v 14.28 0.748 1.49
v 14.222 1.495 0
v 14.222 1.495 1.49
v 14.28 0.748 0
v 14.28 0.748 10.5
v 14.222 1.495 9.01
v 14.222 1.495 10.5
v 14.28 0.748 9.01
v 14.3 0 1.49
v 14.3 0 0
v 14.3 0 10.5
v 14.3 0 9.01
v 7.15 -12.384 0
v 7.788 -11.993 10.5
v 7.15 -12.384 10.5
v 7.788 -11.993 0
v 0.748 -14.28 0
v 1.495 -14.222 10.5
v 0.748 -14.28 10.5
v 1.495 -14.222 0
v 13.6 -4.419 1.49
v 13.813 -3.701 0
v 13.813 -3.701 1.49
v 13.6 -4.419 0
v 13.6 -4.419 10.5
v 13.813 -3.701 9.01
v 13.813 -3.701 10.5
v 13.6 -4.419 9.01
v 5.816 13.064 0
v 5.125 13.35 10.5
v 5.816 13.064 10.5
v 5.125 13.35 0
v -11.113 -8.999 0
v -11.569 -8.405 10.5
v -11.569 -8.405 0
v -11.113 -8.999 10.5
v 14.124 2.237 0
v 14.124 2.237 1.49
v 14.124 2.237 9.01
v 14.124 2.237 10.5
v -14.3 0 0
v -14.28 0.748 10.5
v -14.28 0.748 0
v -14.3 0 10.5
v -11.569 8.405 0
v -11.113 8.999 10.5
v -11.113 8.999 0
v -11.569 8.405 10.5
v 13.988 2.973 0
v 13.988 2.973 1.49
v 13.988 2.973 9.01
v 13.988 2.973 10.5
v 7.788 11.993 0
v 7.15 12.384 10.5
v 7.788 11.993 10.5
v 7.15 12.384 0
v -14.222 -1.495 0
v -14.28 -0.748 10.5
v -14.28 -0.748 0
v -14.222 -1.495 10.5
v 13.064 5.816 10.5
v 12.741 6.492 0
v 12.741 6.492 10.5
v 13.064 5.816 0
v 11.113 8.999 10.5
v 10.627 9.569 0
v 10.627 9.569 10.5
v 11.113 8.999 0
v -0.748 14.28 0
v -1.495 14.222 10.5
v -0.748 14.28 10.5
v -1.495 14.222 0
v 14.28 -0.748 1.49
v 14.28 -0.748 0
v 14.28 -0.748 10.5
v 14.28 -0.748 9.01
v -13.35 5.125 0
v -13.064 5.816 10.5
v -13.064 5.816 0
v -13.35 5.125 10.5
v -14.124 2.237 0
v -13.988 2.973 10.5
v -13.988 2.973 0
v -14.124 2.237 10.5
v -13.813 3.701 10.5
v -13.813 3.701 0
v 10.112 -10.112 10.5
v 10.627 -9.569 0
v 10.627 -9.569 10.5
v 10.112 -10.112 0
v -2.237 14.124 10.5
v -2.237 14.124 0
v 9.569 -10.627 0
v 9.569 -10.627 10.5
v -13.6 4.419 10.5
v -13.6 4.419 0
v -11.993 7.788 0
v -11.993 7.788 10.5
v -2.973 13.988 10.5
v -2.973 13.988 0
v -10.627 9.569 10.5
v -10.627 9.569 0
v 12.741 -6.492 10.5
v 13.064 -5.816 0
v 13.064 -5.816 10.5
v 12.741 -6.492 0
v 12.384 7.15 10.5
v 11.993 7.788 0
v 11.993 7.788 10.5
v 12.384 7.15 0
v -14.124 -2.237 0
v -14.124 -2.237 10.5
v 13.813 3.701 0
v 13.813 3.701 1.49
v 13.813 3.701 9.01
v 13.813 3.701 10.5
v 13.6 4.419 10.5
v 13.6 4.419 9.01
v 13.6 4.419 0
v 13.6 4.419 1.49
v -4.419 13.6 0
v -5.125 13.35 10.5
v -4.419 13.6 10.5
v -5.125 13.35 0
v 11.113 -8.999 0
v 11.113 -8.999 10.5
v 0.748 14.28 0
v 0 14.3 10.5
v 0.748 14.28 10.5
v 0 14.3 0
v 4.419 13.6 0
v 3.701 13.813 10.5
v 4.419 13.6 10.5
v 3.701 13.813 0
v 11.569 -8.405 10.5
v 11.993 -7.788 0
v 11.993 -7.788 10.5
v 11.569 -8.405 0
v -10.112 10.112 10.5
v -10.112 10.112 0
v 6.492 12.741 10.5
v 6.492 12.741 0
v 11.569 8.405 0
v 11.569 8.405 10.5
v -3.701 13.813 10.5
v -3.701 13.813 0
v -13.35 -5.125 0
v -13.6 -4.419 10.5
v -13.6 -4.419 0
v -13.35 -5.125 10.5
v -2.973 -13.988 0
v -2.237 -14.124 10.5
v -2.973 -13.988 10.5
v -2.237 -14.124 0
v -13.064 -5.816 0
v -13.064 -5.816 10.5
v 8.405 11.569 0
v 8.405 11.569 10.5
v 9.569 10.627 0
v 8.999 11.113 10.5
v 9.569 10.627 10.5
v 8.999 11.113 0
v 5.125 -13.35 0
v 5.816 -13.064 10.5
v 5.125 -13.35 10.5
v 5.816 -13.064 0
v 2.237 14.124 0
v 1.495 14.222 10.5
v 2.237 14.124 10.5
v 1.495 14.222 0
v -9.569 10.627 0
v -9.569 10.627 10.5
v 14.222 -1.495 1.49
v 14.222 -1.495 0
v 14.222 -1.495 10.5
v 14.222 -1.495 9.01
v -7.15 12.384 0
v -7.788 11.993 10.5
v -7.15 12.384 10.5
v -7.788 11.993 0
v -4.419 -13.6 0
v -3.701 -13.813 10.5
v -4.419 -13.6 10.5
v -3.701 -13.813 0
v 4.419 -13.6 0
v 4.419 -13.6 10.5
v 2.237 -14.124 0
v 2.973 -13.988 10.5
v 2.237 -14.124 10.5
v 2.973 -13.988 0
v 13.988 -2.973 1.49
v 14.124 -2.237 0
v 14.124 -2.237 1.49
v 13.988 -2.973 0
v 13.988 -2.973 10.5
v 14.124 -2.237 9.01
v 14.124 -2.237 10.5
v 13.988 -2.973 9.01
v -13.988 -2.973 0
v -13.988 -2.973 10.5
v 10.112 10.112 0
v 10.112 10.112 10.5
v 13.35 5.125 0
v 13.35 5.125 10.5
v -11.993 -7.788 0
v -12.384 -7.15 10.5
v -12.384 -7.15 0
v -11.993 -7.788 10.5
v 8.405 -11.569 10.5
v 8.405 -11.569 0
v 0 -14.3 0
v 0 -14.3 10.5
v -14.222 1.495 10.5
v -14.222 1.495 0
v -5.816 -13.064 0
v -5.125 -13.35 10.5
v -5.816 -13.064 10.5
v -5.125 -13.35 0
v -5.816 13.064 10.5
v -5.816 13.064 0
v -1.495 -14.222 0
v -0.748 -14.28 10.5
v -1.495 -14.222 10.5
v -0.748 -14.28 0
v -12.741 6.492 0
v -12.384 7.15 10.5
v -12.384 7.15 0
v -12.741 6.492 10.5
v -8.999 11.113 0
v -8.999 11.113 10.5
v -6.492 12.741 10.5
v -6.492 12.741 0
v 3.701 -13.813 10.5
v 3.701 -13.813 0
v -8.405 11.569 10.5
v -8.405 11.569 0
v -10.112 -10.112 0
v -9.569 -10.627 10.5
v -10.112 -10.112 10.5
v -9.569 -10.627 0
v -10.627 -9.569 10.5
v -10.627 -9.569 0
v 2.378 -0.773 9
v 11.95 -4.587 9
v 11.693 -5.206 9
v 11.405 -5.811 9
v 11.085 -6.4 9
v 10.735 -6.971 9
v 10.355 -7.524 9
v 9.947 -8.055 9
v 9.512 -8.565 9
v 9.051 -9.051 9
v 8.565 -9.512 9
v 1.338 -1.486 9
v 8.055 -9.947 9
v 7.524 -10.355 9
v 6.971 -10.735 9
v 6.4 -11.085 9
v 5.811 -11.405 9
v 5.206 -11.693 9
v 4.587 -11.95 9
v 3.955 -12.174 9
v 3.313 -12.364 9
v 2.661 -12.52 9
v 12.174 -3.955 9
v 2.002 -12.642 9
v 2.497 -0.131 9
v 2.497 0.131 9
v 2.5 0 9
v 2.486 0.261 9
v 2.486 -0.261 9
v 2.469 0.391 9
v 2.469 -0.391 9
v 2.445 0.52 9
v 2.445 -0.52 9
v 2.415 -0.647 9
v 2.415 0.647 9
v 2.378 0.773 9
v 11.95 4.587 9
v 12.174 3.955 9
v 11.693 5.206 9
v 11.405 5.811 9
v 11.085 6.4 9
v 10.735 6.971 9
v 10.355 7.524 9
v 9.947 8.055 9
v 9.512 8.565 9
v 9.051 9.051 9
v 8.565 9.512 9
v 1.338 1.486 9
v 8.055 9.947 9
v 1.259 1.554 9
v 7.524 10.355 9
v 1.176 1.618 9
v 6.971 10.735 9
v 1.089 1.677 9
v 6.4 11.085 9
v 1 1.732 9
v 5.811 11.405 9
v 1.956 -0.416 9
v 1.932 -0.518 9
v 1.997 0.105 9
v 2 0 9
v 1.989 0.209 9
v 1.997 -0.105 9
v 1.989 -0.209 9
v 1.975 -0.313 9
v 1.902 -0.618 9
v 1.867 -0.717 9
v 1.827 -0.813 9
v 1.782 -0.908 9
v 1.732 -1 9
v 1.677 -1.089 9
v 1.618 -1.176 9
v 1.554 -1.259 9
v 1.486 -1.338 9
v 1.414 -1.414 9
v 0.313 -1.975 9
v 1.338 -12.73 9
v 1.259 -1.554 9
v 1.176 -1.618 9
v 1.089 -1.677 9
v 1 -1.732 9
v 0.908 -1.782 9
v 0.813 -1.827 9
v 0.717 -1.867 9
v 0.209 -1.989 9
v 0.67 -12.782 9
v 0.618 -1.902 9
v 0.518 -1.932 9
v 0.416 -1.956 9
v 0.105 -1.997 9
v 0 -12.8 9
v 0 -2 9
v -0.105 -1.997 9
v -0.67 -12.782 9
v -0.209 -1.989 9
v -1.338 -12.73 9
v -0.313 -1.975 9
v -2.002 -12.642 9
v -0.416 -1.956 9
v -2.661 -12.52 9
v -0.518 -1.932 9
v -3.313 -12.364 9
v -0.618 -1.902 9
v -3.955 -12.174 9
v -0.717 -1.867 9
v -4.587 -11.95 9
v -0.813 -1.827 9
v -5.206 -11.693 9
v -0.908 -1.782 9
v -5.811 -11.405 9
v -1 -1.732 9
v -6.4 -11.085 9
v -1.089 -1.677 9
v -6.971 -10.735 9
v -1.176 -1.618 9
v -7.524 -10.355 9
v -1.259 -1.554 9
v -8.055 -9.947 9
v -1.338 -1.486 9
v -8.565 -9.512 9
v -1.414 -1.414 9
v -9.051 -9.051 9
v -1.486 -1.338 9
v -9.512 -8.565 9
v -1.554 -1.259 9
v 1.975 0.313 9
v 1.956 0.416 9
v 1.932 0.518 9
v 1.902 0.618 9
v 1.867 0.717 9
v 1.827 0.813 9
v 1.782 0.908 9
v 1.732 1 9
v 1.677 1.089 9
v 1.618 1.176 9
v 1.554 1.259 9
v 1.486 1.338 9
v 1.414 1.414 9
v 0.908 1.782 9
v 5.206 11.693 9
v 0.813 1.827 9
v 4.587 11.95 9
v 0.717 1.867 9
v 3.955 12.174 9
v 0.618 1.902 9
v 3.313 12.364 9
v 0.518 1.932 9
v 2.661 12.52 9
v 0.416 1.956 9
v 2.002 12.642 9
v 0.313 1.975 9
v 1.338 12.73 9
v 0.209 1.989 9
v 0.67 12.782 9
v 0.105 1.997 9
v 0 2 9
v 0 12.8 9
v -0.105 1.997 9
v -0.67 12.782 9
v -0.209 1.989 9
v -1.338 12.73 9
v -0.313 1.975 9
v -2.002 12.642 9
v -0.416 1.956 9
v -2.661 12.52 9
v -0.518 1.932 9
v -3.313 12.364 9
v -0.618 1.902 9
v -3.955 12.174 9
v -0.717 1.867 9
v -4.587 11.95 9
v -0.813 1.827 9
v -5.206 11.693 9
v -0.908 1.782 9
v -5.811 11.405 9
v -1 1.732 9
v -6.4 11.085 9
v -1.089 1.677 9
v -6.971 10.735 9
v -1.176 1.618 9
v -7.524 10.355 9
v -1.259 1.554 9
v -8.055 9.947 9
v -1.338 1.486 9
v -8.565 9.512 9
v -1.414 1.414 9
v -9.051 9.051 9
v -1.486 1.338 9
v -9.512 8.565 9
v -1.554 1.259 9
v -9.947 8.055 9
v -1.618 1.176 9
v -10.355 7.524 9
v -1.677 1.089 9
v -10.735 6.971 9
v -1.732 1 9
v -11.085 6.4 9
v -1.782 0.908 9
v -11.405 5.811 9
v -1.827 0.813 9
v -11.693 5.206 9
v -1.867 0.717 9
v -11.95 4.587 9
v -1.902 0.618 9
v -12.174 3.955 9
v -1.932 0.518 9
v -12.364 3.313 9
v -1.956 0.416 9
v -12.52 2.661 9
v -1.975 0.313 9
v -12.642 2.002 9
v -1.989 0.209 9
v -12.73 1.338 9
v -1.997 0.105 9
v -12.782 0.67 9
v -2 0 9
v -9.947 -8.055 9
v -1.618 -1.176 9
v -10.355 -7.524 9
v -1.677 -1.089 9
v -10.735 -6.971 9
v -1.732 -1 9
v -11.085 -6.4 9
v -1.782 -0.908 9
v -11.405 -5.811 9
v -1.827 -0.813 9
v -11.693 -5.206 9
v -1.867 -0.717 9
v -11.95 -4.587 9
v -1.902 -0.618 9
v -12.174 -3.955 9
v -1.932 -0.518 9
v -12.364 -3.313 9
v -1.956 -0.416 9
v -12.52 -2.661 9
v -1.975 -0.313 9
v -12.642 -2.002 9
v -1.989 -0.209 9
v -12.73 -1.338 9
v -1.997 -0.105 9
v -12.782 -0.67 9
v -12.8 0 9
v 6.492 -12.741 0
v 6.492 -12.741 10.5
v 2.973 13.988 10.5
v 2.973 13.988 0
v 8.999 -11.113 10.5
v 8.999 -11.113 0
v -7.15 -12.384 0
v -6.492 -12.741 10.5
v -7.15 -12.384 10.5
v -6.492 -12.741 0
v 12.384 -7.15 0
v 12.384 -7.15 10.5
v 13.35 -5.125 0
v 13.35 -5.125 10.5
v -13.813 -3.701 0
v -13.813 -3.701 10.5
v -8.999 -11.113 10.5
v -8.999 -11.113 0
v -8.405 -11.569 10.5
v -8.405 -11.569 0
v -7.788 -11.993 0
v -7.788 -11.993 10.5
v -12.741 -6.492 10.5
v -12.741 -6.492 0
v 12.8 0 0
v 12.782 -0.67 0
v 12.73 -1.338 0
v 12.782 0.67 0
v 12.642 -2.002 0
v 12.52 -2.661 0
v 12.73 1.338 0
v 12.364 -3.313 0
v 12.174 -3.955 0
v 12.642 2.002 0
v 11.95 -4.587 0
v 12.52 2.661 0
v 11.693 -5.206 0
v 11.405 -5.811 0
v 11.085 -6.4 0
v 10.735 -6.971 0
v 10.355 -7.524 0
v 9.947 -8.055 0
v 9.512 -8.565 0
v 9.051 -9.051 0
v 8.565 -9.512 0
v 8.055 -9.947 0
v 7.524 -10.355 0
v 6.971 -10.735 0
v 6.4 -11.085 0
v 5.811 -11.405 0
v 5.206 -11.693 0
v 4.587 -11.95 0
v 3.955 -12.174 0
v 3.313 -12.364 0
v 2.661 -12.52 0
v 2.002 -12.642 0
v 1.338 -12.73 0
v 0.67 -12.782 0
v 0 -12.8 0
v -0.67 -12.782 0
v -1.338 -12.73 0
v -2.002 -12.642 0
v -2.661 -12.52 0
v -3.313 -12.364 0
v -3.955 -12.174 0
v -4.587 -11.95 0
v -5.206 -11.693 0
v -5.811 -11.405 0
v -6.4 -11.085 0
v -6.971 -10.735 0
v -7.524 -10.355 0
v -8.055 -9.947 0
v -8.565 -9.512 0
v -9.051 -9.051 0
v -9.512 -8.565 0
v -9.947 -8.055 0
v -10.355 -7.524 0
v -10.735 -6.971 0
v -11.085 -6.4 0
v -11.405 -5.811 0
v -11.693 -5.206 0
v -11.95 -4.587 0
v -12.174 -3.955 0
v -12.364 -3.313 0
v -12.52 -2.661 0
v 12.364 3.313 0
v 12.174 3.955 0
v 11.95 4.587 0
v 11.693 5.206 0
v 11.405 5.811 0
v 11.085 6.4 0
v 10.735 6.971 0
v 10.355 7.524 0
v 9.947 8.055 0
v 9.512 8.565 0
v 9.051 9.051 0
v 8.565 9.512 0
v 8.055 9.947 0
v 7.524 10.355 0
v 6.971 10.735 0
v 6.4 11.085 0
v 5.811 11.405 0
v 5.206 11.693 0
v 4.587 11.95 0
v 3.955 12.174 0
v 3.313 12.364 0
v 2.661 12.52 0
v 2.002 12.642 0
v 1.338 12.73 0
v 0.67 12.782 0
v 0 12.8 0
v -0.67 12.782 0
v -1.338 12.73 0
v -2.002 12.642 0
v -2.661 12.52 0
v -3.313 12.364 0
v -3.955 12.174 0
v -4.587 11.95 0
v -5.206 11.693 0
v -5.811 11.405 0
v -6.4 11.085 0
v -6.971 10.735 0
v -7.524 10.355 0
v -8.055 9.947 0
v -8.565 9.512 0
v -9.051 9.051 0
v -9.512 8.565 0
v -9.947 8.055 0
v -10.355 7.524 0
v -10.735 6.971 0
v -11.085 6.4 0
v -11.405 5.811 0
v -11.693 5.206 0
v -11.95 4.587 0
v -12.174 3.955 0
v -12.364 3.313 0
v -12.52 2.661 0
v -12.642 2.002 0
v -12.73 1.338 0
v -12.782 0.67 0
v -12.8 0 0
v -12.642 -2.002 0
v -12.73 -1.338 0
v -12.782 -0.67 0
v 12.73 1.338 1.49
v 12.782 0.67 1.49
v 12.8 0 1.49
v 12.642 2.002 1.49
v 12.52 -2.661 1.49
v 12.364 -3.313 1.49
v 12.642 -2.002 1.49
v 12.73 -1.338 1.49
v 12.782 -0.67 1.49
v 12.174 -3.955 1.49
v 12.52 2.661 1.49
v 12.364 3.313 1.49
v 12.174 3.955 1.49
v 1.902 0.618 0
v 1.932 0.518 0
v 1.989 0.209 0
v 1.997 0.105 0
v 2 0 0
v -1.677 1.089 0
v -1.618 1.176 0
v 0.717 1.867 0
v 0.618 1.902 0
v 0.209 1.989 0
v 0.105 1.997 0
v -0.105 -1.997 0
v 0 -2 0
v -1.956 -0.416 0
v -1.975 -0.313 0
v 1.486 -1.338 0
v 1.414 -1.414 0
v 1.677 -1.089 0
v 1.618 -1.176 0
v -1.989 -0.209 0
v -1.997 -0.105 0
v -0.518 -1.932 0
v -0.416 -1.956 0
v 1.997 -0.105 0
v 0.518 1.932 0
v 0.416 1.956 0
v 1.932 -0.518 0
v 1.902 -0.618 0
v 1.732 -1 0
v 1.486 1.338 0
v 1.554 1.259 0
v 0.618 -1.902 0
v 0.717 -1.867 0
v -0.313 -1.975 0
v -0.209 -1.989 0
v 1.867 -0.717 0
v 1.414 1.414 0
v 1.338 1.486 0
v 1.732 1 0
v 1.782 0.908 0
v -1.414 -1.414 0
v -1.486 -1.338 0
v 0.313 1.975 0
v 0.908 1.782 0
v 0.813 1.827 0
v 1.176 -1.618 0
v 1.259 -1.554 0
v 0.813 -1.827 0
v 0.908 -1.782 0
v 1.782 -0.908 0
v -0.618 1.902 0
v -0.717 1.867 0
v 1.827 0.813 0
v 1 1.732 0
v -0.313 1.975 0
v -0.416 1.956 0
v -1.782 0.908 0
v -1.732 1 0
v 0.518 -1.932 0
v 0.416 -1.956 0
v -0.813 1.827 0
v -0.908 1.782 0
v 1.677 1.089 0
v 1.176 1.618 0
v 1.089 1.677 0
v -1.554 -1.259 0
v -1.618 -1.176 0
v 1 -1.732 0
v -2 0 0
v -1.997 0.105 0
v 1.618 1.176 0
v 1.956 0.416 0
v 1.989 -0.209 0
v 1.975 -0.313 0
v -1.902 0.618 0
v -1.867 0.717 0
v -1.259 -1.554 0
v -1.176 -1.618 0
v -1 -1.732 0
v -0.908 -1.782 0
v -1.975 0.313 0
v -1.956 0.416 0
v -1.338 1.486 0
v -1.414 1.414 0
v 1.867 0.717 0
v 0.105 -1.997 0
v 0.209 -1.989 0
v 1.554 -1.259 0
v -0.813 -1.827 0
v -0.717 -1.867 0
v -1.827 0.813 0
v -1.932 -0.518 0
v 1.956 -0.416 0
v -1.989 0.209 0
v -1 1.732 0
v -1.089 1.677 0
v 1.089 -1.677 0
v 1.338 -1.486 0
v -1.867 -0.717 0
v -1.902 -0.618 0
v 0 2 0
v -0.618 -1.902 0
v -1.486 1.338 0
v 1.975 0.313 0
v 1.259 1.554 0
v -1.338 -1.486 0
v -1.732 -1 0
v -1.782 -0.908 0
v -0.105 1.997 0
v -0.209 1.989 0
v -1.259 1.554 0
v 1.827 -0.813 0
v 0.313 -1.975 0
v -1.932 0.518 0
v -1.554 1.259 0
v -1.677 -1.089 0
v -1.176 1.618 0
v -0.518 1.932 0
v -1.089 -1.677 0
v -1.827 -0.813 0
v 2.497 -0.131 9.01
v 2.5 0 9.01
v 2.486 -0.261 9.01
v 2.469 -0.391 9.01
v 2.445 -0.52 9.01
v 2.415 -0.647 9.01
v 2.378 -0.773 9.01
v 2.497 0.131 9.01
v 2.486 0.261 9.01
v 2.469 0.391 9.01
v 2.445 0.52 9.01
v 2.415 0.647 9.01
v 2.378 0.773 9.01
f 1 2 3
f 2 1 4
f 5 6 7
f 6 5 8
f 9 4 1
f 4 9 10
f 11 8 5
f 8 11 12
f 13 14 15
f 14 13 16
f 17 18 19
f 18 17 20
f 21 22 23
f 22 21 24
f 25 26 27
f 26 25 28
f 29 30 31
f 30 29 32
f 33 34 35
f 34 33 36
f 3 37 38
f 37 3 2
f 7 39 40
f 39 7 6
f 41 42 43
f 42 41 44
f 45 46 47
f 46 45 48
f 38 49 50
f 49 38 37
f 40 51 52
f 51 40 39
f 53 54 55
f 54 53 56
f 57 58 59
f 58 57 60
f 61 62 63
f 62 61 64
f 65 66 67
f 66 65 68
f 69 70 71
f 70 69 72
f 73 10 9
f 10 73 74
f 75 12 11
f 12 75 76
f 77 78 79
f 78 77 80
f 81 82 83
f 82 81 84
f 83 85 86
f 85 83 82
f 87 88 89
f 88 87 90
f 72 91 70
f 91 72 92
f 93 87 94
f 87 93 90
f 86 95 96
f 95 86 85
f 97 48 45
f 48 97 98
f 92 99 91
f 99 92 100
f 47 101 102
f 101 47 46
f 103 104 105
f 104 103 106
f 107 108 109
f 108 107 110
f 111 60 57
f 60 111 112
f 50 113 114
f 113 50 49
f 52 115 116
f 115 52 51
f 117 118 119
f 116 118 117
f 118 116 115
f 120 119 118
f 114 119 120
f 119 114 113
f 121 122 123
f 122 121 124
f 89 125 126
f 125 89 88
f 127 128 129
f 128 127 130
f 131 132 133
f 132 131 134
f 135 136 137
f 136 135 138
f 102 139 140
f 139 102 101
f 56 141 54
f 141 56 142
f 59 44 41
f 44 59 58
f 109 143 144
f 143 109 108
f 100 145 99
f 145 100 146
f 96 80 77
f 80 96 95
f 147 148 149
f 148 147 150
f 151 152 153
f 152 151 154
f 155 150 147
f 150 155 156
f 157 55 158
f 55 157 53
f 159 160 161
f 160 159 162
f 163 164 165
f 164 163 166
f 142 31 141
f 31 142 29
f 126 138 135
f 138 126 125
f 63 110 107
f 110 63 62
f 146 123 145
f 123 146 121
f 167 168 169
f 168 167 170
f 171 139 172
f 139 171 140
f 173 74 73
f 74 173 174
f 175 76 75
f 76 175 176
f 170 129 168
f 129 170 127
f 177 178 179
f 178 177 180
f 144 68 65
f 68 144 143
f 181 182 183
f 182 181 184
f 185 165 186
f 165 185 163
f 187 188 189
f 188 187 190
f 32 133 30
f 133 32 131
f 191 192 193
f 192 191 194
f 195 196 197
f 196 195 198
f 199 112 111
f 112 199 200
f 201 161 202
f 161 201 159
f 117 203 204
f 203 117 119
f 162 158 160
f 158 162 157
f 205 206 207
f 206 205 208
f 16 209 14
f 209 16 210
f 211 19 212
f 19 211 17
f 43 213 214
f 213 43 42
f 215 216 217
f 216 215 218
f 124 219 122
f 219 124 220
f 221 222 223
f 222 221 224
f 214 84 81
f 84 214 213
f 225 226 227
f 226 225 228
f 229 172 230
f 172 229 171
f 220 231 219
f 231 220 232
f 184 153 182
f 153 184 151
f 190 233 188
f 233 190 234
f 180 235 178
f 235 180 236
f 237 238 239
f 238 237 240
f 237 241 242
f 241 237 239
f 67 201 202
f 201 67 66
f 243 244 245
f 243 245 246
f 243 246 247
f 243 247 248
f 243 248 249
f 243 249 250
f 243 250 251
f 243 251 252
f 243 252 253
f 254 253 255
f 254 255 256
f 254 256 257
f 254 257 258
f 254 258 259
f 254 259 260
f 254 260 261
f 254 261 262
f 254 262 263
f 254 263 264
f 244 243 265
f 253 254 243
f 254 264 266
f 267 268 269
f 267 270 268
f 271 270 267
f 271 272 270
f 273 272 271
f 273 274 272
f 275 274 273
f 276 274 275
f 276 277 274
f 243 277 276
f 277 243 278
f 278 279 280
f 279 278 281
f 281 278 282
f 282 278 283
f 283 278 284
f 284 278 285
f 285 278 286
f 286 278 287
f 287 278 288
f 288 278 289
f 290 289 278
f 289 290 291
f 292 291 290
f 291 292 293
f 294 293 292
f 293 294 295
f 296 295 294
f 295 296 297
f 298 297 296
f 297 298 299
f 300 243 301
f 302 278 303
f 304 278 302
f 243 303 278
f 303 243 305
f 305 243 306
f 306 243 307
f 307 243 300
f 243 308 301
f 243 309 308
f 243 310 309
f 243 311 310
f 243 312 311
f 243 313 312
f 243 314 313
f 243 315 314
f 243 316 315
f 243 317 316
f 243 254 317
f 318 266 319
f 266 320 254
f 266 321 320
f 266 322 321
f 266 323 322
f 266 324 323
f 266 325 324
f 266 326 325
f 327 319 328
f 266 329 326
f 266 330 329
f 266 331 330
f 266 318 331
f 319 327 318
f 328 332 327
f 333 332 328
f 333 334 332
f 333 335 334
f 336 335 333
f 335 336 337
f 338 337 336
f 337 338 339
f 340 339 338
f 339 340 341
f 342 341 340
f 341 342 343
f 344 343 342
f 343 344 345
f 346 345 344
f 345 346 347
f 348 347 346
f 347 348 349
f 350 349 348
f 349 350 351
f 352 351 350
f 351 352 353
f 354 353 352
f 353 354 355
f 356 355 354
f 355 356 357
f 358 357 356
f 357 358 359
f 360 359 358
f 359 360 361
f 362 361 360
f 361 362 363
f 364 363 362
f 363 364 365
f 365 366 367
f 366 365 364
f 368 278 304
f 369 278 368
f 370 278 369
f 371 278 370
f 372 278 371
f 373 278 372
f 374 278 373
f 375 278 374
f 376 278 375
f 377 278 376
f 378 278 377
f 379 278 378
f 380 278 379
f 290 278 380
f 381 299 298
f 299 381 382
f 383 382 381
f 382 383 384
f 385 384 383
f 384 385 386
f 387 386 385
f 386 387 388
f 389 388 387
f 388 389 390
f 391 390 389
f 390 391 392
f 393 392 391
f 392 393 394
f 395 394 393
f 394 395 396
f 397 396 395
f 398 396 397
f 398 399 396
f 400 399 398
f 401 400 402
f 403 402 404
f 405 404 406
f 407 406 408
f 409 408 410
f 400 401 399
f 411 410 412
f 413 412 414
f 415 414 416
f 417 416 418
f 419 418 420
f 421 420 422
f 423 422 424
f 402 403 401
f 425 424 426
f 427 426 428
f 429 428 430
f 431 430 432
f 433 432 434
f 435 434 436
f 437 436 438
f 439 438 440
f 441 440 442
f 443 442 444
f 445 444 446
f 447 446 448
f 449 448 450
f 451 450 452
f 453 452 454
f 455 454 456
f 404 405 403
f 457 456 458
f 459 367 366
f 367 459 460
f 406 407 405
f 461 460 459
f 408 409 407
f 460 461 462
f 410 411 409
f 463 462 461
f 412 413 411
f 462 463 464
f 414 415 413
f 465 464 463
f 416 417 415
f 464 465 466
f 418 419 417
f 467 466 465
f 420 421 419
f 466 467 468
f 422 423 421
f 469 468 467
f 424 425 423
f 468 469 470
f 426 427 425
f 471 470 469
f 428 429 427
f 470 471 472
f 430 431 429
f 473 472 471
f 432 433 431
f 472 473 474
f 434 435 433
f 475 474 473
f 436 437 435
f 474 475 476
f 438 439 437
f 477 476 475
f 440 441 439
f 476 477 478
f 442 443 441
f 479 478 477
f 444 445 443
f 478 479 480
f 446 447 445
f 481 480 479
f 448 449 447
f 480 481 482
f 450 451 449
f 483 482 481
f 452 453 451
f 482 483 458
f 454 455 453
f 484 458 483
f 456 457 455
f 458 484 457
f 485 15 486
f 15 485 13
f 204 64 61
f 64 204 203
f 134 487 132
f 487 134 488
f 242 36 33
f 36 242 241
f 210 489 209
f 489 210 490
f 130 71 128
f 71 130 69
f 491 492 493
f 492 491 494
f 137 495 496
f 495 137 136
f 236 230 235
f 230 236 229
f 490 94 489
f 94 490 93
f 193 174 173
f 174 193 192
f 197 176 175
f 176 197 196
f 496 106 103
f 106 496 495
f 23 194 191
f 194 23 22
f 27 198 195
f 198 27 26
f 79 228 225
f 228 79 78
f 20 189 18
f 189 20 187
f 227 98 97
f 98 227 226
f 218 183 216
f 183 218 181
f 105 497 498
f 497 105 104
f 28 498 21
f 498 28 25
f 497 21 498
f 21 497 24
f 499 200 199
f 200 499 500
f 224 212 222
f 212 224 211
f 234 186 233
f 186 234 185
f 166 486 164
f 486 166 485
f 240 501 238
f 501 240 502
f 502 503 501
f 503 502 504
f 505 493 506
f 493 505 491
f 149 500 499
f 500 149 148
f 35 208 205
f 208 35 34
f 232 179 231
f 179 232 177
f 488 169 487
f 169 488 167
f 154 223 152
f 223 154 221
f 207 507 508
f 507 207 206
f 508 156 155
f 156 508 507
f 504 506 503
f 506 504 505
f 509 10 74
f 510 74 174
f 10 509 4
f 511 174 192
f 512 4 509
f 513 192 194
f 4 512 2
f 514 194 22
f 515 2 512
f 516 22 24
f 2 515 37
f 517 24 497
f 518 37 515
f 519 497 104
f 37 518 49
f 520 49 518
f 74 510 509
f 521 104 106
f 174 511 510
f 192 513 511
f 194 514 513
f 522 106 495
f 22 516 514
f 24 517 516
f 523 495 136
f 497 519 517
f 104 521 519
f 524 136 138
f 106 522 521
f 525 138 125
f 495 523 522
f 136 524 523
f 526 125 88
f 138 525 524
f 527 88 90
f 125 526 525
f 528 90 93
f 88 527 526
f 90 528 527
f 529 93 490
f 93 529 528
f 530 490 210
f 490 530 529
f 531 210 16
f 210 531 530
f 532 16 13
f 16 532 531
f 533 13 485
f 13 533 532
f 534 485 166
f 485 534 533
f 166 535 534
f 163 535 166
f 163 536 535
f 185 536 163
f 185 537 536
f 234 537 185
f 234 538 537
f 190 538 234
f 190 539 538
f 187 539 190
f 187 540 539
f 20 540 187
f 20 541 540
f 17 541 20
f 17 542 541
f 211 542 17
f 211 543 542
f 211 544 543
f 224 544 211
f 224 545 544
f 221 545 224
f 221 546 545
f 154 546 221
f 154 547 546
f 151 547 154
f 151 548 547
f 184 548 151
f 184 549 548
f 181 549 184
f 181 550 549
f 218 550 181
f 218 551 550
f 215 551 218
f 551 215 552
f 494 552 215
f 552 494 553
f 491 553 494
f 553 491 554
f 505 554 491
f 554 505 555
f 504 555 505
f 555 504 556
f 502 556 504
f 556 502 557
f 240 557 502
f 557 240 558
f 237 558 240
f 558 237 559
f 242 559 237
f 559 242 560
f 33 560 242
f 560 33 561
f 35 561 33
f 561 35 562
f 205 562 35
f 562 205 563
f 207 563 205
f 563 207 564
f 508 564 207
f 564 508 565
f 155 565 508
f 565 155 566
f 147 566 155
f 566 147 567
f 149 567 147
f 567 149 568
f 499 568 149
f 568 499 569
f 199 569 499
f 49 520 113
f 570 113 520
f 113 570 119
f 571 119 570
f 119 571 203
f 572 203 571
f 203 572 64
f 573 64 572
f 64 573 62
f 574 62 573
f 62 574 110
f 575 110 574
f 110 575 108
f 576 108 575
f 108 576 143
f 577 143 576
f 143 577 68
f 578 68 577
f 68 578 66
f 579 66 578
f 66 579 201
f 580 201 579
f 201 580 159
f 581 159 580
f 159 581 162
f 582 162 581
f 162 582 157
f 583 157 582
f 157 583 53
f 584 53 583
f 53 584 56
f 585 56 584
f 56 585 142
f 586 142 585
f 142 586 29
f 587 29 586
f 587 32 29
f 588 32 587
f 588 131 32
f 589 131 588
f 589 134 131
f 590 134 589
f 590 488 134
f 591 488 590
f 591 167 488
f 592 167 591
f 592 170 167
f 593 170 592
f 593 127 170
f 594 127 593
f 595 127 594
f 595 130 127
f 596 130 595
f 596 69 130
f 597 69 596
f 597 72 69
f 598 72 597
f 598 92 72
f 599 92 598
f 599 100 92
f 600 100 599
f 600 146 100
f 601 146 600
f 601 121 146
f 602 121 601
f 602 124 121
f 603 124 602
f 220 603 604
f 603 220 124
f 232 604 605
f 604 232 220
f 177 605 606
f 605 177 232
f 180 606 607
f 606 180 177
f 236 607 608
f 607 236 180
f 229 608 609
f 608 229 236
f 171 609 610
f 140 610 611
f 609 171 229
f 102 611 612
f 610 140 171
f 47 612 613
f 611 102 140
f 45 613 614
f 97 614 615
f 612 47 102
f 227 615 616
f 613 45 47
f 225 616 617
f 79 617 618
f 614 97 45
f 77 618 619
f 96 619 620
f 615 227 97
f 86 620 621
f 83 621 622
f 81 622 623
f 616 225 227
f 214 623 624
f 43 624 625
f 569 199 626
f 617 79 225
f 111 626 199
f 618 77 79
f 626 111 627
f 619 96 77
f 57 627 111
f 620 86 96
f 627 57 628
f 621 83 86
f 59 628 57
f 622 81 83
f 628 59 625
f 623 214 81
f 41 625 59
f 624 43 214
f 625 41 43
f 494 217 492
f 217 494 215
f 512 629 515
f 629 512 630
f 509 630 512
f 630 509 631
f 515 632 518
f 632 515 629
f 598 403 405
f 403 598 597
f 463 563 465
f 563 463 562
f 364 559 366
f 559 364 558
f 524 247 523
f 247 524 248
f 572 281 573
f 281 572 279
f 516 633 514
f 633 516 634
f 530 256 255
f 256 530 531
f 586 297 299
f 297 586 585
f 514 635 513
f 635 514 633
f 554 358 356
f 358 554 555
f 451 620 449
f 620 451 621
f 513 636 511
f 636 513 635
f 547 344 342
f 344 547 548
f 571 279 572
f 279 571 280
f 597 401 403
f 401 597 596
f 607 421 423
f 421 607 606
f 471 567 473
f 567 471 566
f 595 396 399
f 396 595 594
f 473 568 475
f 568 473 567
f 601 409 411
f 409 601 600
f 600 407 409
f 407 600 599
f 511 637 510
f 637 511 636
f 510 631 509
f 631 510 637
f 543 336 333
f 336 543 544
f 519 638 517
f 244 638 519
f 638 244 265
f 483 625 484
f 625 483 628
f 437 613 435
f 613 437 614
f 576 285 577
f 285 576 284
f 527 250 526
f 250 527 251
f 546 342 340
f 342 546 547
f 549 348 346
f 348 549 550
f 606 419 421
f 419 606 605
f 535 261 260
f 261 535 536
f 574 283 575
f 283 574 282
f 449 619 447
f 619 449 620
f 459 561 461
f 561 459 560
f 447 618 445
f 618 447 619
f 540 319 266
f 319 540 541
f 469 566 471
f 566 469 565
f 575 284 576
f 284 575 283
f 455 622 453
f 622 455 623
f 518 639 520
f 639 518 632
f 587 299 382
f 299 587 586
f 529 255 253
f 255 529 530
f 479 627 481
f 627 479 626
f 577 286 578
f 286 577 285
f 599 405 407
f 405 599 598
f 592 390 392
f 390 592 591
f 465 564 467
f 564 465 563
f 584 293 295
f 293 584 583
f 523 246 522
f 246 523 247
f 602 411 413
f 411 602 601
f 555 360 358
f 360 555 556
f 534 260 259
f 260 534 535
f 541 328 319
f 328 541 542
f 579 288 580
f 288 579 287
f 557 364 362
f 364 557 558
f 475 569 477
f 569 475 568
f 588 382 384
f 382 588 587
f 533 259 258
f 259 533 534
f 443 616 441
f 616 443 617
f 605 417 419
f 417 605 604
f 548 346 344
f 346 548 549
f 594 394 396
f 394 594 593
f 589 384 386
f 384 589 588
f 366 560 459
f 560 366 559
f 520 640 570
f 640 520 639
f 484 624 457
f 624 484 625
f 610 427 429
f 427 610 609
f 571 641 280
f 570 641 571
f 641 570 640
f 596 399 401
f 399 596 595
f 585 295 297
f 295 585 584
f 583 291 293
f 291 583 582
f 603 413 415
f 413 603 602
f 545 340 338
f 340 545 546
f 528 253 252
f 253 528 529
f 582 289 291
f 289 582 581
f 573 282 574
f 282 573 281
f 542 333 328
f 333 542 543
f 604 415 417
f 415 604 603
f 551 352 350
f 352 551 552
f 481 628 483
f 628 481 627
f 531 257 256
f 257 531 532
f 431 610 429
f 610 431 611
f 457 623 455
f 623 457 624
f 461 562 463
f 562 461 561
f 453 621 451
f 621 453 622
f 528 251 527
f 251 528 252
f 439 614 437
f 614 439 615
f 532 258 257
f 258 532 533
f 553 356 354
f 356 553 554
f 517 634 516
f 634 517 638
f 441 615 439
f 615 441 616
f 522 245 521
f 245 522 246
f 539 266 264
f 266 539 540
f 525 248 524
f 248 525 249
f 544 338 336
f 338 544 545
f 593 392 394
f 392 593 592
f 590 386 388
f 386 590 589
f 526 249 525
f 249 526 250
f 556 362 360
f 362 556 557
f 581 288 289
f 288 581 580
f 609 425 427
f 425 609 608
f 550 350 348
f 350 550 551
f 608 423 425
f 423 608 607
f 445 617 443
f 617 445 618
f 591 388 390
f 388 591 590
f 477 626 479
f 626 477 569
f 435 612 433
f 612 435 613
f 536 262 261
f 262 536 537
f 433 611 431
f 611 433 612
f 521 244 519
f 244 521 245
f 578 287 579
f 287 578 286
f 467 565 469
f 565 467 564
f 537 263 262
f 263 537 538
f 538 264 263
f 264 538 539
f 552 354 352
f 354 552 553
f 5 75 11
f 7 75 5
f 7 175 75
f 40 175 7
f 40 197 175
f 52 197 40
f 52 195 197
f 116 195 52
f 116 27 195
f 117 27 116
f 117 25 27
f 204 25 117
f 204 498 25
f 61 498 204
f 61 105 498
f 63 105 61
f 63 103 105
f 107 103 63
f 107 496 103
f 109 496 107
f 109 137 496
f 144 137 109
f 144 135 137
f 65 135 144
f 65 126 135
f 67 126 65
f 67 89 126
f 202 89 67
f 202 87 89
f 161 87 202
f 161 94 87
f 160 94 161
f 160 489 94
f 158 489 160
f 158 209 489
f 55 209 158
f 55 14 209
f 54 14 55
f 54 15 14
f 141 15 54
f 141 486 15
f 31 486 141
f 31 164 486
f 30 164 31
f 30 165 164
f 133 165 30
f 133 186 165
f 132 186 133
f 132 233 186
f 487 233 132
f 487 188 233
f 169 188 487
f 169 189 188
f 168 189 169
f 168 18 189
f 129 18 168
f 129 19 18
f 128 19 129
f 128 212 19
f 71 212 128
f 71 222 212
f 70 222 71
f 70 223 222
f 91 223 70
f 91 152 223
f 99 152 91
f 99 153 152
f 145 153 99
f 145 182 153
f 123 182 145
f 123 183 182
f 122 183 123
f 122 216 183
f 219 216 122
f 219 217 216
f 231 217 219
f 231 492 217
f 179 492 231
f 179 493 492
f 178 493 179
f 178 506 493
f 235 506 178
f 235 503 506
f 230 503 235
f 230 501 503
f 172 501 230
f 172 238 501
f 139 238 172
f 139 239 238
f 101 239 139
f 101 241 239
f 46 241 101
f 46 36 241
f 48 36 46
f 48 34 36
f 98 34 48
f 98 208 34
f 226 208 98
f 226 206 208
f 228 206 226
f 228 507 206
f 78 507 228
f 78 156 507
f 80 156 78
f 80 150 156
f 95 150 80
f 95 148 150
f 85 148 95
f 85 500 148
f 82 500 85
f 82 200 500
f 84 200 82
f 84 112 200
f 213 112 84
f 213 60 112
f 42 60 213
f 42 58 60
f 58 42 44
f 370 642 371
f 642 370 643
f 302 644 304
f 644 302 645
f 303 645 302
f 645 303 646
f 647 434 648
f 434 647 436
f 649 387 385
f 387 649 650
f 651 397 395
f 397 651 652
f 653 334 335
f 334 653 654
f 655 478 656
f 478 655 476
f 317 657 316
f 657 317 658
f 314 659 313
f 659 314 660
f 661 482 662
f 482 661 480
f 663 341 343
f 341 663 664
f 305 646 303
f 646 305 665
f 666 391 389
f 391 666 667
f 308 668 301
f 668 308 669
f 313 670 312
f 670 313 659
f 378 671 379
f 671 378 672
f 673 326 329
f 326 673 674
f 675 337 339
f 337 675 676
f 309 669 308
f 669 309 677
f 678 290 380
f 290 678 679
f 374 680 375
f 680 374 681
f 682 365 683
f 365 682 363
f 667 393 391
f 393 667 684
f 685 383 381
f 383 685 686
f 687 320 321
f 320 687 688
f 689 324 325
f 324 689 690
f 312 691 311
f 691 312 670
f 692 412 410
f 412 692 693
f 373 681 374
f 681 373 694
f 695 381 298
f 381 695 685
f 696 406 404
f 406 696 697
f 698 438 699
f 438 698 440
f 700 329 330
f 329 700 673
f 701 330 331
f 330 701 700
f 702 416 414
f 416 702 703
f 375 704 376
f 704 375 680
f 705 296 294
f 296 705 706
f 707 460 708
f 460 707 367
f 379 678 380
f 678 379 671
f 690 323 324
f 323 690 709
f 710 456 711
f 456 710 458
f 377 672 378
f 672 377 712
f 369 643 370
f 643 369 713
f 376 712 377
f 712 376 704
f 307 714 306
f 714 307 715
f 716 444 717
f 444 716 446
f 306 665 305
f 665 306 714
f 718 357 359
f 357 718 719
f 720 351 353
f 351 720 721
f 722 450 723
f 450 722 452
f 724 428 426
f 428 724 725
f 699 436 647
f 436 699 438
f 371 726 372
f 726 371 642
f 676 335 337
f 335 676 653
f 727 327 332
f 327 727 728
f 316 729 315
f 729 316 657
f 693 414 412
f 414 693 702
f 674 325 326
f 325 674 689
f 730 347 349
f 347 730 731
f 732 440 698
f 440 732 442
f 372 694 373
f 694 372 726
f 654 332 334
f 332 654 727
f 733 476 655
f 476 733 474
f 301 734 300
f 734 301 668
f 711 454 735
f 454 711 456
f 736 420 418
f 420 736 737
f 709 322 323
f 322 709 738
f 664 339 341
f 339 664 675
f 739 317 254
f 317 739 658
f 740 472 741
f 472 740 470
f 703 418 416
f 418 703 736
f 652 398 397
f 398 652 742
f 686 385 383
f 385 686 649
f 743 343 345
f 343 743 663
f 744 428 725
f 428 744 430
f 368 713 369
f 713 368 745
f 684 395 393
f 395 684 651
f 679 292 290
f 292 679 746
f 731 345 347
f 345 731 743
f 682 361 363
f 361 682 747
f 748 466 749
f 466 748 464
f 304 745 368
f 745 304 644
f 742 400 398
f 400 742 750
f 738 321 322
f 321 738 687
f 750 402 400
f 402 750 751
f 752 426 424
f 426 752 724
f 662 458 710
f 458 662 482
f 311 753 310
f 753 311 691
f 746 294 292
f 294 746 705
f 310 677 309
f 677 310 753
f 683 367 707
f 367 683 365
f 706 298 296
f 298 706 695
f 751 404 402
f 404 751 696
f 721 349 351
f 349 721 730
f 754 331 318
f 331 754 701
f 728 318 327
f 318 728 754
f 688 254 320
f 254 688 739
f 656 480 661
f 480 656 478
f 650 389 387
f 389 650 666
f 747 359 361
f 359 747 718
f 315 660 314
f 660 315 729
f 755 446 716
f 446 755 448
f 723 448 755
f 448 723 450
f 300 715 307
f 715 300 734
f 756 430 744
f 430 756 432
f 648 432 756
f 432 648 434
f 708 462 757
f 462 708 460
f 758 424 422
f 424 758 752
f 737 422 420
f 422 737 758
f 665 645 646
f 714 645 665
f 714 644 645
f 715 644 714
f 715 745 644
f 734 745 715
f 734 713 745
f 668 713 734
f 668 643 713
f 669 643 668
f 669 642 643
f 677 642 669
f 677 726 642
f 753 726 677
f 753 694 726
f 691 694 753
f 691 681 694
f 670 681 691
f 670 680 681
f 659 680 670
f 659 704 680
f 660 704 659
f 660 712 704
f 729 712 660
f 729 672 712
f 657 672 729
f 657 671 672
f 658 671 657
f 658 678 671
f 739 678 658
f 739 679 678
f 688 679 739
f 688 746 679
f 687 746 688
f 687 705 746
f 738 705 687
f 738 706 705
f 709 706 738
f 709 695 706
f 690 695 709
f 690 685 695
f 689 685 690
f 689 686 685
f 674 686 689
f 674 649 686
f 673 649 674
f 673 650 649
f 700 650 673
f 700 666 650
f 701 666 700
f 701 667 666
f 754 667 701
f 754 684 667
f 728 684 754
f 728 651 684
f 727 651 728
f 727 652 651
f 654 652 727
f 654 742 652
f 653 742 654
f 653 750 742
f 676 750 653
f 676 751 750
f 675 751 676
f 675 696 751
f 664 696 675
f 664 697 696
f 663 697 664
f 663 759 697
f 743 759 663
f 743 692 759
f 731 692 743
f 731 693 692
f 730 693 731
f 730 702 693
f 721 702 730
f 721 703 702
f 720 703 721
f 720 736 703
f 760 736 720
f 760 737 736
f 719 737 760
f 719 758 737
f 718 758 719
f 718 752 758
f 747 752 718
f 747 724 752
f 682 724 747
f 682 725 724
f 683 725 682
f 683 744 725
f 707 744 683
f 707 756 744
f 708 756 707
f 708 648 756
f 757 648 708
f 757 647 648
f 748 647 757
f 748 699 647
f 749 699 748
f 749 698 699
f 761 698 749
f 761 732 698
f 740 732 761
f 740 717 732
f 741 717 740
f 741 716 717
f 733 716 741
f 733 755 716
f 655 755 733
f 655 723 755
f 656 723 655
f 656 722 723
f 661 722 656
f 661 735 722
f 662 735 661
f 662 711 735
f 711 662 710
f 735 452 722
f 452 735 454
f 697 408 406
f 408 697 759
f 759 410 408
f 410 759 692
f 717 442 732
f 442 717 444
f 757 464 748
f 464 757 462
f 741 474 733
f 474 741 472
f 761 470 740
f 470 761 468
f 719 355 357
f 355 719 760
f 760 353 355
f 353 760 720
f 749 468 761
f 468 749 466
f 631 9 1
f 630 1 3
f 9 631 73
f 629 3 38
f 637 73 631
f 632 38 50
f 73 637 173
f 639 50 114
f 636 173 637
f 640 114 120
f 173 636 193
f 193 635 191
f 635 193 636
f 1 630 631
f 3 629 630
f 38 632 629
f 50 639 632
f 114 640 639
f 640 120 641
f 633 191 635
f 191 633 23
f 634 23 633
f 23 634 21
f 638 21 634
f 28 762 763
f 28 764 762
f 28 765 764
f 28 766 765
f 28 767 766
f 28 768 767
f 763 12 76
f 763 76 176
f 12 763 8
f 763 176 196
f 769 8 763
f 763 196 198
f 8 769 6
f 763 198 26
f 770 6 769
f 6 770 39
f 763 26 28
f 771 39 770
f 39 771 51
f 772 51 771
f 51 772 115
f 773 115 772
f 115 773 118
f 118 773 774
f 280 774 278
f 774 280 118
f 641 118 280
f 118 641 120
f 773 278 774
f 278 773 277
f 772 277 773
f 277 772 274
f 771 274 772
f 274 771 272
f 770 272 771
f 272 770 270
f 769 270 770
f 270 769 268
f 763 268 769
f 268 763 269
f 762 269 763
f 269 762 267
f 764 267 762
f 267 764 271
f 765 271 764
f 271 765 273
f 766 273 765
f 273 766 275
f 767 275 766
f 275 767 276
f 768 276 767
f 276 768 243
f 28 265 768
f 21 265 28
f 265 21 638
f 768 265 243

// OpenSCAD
// ============================================================
//  Cover for Counter Cylinder
//  Hollow cylinder with viewing window, rod, and optional rounded top
// ============================================================

// ── Parameters (edit here) ──────────────────────────────────
cylinder_diameter = 25;    // base cylinder diameter [mm]
gap              = 0.3;    // gap between cover and inner cylinder [mm]
thickness        = 1.5;    // wall thickness [mm]
number_of_digits = 2;      // number of digit layers
digit_height     = 3;      // height per digit layer [mm]
rod_diameter     = 4;      // central rod diameter [mm]
$fn              = 120;    // curve resolution (higher = smoother)

// ── Derived values ──────────────────────────────────────────
inner_diameter  = cylinder_diameter + 2 * gap;
outer_diameter  = inner_diameter + 2 * thickness;
cover_height    = number_of_digits * digit_height + thickness * 2;
rod_height      = cover_height;
window_angle    = 36;  // 360/10 = 36° for 1/10th opening

// ── Model ───────────────────────────────────────────────────
difference() {
    // Main cover body
    union() {
        // Outer cylinder (flat top)
        translate([0, 0, cover_height ])          cylinder(h = thickness, d = outer_diameter, center = false);
        // Hollow cylinder
        difference() {
            cylinder(h = cover_height, d = outer_diameter, center = false);      
            // Inner hollow space
            translate([0, 0, -0.01])  // slight overlap to avoid z-fighting
            cylinder(h = cover_height + 0.02, d = inner_diameter, center = false);
        }
        
        // Central rod
        cylinder(h = rod_height, d = rod_diameter, center = false);
    }
    
    // Viewing window (sector centered on cylinder, avoiding rod)
    rotate([0, 0, -window_angle/2])  // center the window
    translate([0, 0, thickness -0.01])  // slight overlap to avoid z-fighting
    linear_extrude(height = cover_height - thickness + 0.02)
    difference() {
        // Outer sector
        polygon([
            [0, 0],
            [outer_diameter * cos(window_angle), outer_diameter * sin(window_angle)],
            [outer_diameter, 0]
        ]);
        // Inner circle to avoid rod
        circle(d = rod_diameter + 1);  // +1mm clearance around rod
    }
}
